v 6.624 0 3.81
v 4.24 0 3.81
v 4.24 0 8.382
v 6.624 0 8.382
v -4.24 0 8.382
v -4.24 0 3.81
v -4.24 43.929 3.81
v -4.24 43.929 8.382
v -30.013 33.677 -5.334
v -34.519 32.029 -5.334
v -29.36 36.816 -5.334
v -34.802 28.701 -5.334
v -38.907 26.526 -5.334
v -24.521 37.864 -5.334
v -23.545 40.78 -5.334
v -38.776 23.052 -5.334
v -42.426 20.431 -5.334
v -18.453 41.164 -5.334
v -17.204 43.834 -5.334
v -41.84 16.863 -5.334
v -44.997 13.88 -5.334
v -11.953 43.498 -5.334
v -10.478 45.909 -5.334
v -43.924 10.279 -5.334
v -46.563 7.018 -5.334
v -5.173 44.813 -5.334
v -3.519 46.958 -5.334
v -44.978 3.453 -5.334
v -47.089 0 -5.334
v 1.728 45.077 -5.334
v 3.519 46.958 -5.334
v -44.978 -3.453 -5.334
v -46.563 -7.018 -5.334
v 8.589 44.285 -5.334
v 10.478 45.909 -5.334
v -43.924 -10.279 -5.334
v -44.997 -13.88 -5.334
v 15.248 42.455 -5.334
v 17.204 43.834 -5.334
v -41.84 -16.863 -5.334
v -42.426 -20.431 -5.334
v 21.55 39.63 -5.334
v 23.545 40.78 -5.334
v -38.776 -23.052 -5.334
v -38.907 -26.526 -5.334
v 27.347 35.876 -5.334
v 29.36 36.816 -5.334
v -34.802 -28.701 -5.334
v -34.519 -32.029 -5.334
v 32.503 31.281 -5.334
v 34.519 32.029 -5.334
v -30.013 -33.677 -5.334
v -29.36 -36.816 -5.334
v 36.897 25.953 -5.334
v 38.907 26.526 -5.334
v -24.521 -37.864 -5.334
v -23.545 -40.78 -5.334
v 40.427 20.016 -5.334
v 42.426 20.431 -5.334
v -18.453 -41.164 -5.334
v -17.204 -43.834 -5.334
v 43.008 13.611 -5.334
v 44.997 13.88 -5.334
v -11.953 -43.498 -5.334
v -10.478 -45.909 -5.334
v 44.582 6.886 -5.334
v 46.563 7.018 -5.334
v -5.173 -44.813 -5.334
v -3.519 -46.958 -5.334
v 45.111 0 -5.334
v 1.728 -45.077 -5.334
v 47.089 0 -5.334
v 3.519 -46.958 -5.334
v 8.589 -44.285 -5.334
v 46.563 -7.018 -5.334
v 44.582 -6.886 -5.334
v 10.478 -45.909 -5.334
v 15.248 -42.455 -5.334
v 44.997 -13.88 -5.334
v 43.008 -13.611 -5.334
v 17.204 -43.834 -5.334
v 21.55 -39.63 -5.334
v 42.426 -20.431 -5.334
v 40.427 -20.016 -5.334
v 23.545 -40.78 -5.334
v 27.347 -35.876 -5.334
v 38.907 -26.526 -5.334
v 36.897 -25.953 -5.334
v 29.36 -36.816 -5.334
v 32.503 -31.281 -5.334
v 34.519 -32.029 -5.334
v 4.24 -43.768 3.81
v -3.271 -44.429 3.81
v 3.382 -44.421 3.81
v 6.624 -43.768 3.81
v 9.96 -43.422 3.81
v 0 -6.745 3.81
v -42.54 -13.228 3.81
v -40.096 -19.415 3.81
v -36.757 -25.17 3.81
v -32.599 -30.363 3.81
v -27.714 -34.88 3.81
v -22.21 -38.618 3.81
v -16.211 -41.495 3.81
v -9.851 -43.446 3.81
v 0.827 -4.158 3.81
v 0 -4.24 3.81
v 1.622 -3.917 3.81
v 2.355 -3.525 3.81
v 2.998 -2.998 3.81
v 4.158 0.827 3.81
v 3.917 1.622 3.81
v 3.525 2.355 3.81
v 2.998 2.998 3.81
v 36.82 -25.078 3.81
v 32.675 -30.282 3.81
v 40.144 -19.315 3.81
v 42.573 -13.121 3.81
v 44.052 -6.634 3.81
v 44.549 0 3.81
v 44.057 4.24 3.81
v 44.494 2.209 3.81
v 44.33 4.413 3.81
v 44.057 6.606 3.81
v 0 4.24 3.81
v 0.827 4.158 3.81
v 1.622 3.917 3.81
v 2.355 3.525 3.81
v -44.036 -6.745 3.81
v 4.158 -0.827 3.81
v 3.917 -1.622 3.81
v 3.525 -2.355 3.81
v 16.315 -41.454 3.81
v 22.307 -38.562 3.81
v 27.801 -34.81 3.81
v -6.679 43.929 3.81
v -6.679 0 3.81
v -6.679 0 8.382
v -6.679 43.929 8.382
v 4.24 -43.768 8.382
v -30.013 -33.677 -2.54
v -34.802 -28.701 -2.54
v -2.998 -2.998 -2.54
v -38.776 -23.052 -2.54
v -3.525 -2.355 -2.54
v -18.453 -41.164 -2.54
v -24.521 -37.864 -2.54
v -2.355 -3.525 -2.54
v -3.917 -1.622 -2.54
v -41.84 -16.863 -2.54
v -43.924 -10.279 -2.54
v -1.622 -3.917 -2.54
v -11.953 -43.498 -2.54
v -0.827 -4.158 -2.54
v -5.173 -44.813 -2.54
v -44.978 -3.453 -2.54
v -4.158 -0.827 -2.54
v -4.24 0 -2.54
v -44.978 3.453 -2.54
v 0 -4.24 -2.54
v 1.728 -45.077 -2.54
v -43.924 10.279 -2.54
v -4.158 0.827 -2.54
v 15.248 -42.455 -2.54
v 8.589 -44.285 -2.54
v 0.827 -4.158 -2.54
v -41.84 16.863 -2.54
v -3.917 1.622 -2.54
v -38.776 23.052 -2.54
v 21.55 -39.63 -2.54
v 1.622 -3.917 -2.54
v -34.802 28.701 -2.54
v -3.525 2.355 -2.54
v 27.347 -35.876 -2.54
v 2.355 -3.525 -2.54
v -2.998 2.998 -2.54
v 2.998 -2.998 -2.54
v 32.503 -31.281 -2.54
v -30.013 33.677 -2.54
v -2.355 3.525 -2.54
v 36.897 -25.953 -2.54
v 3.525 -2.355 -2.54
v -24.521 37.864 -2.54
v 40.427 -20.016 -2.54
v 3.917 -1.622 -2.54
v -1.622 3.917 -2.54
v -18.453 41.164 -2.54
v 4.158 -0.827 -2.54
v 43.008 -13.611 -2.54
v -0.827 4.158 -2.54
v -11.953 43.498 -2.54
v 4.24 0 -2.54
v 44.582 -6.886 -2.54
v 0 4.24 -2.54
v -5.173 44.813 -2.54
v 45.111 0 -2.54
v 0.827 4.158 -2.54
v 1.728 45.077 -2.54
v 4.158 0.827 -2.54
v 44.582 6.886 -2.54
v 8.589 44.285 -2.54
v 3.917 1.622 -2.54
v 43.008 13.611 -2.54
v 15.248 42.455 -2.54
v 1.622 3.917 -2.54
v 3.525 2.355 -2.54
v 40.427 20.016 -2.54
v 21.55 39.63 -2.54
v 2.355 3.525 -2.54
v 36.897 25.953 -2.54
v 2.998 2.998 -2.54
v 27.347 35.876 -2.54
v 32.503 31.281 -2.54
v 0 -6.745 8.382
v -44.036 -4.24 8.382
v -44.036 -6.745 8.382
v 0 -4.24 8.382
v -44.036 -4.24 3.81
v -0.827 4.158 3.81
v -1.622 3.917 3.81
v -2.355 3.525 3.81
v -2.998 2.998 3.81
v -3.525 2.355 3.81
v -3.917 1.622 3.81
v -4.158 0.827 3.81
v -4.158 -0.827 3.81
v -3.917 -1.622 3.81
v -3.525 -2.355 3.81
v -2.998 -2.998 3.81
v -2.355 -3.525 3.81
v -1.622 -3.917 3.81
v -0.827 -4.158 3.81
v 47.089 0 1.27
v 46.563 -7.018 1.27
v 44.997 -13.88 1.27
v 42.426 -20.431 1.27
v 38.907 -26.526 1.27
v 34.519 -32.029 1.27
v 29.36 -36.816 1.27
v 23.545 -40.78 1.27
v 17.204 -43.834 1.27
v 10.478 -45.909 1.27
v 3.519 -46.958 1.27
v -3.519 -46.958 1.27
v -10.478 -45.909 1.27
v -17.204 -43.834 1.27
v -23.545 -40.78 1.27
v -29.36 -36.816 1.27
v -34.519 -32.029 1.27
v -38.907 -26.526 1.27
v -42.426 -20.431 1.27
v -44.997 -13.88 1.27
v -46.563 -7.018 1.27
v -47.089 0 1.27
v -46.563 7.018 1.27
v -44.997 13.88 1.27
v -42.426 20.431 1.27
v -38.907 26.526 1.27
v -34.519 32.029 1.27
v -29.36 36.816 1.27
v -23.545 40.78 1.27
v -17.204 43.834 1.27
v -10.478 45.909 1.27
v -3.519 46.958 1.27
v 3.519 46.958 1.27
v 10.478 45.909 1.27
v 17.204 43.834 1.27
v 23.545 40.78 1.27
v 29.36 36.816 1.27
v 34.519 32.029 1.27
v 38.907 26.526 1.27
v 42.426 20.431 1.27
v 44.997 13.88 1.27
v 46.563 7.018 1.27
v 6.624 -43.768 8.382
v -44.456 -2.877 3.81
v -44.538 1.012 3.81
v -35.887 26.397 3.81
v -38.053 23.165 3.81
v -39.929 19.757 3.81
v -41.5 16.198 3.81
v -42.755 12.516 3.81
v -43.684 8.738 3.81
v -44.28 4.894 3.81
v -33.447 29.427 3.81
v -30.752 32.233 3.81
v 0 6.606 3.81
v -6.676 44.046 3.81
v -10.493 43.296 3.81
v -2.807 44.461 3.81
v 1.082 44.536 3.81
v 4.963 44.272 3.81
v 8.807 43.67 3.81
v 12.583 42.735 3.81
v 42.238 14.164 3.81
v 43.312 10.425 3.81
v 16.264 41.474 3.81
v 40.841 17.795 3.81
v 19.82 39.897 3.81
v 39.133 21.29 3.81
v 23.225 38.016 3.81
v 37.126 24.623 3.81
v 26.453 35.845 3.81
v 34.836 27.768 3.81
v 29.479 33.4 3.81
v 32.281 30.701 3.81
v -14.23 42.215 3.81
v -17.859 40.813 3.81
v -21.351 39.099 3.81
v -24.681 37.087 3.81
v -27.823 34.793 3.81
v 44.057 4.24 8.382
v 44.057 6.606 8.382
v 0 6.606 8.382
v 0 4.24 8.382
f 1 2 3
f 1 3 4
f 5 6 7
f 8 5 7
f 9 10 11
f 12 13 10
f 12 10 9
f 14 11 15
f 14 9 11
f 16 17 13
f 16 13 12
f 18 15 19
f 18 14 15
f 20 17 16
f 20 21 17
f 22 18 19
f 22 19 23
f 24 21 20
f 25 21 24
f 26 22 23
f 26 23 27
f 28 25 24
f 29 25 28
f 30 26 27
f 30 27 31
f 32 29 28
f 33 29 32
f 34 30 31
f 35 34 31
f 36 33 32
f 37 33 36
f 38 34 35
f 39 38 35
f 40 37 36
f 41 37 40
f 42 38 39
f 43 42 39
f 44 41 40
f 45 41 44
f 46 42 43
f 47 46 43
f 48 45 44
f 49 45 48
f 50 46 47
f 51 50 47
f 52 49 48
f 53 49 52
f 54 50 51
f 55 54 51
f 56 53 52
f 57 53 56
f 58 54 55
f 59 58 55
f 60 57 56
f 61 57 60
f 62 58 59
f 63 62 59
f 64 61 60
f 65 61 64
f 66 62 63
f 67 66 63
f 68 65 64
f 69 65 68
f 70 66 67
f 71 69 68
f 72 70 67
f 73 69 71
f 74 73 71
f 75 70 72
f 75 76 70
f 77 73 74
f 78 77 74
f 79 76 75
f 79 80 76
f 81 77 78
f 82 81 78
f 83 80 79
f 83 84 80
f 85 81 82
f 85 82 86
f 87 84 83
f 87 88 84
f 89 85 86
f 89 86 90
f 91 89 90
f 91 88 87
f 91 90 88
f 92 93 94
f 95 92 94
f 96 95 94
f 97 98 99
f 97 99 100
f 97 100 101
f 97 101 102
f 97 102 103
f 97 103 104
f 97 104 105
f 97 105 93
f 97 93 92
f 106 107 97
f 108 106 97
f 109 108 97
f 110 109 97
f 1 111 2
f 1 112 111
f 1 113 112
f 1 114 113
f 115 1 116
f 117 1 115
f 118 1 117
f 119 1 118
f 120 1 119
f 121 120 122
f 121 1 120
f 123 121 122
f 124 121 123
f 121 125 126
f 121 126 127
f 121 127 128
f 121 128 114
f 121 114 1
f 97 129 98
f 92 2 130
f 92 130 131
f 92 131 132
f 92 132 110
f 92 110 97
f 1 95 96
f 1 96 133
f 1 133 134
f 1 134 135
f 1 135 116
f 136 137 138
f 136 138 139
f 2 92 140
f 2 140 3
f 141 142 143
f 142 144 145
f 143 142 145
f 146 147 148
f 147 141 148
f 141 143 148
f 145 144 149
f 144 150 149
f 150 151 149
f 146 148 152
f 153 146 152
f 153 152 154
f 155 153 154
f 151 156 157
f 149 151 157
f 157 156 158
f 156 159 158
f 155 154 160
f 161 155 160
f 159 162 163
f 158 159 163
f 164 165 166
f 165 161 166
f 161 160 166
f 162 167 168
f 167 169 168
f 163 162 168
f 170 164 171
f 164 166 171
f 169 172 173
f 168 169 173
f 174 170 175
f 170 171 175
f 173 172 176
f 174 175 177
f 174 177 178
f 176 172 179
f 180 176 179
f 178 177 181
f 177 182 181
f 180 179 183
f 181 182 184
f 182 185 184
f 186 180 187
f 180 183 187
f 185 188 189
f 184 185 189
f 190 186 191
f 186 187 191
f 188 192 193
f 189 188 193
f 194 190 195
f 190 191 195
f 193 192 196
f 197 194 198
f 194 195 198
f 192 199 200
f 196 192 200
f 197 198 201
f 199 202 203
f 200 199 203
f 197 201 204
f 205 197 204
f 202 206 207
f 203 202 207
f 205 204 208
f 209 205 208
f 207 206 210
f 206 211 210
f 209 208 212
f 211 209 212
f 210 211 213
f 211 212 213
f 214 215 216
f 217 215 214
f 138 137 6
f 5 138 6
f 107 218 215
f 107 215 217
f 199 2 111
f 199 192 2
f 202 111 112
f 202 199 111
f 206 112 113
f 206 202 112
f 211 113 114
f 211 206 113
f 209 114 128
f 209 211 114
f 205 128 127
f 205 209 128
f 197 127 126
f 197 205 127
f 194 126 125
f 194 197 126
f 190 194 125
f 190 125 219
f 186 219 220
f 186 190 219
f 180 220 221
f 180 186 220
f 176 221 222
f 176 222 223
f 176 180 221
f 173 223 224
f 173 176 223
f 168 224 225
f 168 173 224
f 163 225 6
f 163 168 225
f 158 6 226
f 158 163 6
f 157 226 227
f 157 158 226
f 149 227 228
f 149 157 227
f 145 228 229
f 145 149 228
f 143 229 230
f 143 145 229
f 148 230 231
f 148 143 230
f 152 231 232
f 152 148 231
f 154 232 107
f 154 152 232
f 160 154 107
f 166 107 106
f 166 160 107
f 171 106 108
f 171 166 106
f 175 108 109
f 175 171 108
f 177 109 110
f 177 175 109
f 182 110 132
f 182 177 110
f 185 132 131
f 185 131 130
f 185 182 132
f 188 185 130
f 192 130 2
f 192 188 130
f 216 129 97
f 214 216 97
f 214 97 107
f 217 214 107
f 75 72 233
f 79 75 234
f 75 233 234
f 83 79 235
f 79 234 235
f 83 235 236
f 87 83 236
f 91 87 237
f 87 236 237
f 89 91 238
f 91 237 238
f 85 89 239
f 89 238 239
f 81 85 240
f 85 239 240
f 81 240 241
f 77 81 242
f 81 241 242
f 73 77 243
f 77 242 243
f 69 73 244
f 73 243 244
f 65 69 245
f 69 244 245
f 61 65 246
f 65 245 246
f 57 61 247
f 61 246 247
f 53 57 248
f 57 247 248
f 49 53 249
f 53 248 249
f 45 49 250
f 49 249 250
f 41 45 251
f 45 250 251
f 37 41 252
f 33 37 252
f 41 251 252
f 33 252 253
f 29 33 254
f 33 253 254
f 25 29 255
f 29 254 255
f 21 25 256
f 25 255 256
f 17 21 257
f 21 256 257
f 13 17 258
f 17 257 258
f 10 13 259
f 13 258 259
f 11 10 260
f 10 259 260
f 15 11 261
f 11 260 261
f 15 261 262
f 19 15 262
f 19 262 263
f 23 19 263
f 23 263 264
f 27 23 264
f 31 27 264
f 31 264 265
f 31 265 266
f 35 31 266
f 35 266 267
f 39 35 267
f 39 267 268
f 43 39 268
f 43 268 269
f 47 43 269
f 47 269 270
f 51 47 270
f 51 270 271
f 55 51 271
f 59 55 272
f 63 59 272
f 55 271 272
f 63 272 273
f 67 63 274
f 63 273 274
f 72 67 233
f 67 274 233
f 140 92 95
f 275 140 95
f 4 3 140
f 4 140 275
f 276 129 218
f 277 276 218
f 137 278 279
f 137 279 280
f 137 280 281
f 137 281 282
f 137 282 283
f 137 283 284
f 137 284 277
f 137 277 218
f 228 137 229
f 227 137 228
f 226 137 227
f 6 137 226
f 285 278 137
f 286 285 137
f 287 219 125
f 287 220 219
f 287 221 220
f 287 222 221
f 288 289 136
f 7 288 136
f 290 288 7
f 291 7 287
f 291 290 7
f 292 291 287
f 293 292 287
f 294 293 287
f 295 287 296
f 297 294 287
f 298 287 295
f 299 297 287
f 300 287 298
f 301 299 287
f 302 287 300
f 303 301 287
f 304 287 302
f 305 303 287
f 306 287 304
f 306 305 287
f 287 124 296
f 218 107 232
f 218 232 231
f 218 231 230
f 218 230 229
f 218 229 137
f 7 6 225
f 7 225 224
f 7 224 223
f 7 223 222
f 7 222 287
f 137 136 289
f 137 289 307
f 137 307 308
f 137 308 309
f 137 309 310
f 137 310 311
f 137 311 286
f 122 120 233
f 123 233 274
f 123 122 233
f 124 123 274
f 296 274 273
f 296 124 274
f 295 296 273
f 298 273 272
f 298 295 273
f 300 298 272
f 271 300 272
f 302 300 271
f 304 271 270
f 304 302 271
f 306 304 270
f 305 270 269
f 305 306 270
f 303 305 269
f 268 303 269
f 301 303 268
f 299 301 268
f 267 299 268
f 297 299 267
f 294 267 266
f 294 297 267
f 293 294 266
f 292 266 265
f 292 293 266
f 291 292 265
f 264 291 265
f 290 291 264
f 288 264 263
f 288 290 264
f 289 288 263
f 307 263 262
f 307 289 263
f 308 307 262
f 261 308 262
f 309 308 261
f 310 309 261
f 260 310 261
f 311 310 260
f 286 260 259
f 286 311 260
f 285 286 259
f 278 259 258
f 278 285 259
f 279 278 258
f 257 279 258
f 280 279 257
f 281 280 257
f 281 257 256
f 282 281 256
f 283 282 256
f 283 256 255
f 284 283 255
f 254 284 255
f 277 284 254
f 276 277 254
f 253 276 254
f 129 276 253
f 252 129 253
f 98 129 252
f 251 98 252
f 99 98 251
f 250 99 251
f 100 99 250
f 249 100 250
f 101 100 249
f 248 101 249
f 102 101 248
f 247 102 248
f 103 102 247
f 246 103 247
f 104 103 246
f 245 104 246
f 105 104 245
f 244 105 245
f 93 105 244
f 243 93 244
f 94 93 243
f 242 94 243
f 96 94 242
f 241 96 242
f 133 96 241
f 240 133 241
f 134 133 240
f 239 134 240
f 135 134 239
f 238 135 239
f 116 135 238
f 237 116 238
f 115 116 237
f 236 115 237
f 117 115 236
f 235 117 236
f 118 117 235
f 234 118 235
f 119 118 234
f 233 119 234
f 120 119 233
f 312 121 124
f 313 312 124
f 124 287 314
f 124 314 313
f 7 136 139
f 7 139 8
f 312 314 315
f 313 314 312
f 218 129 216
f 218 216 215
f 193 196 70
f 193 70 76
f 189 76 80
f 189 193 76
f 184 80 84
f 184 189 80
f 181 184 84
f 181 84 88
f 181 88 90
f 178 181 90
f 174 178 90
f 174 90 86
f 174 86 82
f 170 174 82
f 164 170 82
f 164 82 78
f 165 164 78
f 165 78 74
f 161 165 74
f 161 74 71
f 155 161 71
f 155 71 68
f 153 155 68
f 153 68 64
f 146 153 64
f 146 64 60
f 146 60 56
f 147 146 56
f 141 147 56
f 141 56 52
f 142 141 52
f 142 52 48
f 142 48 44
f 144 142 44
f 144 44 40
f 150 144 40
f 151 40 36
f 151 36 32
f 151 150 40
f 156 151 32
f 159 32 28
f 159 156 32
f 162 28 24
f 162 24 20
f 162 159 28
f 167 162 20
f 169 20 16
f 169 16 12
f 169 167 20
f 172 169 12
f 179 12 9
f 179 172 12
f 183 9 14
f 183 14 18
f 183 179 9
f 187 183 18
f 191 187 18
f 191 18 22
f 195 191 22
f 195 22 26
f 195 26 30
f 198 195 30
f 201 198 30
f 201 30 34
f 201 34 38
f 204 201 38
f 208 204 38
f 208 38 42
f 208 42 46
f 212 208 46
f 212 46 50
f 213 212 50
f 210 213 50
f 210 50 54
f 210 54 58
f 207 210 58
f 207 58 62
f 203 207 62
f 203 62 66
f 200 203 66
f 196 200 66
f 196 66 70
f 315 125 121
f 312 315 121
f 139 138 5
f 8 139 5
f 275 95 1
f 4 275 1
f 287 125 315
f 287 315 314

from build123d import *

# Parameters (mm, degrees)
F0_R     = 47.0892297355
F0_R_2   = 45.1105774951
F0_R_3   = 10.9409208949
F0_R_4   = 4.2395211019
F1_DEPTH = 3.81
F2_SIZE  = 2.54
F3_R     = 47.0892297355
F3_R_2   = 45.1105774951
F4_DEPTH = 5.334
F6_DEPTH = 2.54
F5_W     = 2.4396785341
F5_H     = 43.9290553331
F5_W_2   = 44.0566511325
F5_H_2   = 2.3669424772
F5_W_3   = 2.3844161808
F5_H_3   = 43.7675852008
F5_W_4   = 44.0356882348
F5_H_4   = 2.5052570053
F7_DEPTH = 4.572


with BuildPart() as f1:
    # F0 (on Top) → F1 (new body)
    with BuildSketch(Plane.XY):
        Circle(F0_R)
        Circle(F0_R_2, mode=Mode.SUBTRACT)
        Circle(F0_R_2)
        Circle(F0_R_3, mode=Mode.SUBTRACT)
        Circle(F0_R_3)
        Circle(F0_R_4, mode=Mode.SUBTRACT)
    extrude(amount=F1_DEPTH)

    # F2
    f2_edges = [f1.edges().sort_by_distance(p)[0] for p in [
        (-47.08923, 0, 3.81),
    ]]
    chamfer(f2_edges, length=F2_SIZE)

    # F3 (on face) → F4 (join)
    with BuildSketch(Plane(origin=(0, 0, 0), x_dir=(1, 0, 0), z_dir=(0, 0, -1))):
        Circle(F3_R)
        Circle(F3_R_2, mode=Mode.SUBTRACT)
    extrude(amount=F4_DEPTH)

    # F6 (add): a face of the model
    f6_faces = [f1.faces().sort_by_distance(p)[0] for p in [
        (-43.8346576851, 0, 0),
    ]]
    extrude(f6_faces, amount=F6_DEPTH)

    # F5 (on face) → F7 (join)
    with BuildSketch(Plane.XY.offset(3.81)):
        with Locations((-5.4593603689, 21.9645276666)):
            Rectangle(F5_W, F5_H)
        with Locations((22.0283255662, 5.4229923405)):
            Rectangle(F5_W_2, F5_H_2)
        with Locations((5.4317291923, -21.8837926004)):
            Rectangle(F5_W_3, F5_H_3)
        with Locations((-22.0178441174, -5.4921496045)):
            Rectangle(F5_W_4, F5_H_4)
    extrude(amount=F7_DEPTH)


solid = f1.part
